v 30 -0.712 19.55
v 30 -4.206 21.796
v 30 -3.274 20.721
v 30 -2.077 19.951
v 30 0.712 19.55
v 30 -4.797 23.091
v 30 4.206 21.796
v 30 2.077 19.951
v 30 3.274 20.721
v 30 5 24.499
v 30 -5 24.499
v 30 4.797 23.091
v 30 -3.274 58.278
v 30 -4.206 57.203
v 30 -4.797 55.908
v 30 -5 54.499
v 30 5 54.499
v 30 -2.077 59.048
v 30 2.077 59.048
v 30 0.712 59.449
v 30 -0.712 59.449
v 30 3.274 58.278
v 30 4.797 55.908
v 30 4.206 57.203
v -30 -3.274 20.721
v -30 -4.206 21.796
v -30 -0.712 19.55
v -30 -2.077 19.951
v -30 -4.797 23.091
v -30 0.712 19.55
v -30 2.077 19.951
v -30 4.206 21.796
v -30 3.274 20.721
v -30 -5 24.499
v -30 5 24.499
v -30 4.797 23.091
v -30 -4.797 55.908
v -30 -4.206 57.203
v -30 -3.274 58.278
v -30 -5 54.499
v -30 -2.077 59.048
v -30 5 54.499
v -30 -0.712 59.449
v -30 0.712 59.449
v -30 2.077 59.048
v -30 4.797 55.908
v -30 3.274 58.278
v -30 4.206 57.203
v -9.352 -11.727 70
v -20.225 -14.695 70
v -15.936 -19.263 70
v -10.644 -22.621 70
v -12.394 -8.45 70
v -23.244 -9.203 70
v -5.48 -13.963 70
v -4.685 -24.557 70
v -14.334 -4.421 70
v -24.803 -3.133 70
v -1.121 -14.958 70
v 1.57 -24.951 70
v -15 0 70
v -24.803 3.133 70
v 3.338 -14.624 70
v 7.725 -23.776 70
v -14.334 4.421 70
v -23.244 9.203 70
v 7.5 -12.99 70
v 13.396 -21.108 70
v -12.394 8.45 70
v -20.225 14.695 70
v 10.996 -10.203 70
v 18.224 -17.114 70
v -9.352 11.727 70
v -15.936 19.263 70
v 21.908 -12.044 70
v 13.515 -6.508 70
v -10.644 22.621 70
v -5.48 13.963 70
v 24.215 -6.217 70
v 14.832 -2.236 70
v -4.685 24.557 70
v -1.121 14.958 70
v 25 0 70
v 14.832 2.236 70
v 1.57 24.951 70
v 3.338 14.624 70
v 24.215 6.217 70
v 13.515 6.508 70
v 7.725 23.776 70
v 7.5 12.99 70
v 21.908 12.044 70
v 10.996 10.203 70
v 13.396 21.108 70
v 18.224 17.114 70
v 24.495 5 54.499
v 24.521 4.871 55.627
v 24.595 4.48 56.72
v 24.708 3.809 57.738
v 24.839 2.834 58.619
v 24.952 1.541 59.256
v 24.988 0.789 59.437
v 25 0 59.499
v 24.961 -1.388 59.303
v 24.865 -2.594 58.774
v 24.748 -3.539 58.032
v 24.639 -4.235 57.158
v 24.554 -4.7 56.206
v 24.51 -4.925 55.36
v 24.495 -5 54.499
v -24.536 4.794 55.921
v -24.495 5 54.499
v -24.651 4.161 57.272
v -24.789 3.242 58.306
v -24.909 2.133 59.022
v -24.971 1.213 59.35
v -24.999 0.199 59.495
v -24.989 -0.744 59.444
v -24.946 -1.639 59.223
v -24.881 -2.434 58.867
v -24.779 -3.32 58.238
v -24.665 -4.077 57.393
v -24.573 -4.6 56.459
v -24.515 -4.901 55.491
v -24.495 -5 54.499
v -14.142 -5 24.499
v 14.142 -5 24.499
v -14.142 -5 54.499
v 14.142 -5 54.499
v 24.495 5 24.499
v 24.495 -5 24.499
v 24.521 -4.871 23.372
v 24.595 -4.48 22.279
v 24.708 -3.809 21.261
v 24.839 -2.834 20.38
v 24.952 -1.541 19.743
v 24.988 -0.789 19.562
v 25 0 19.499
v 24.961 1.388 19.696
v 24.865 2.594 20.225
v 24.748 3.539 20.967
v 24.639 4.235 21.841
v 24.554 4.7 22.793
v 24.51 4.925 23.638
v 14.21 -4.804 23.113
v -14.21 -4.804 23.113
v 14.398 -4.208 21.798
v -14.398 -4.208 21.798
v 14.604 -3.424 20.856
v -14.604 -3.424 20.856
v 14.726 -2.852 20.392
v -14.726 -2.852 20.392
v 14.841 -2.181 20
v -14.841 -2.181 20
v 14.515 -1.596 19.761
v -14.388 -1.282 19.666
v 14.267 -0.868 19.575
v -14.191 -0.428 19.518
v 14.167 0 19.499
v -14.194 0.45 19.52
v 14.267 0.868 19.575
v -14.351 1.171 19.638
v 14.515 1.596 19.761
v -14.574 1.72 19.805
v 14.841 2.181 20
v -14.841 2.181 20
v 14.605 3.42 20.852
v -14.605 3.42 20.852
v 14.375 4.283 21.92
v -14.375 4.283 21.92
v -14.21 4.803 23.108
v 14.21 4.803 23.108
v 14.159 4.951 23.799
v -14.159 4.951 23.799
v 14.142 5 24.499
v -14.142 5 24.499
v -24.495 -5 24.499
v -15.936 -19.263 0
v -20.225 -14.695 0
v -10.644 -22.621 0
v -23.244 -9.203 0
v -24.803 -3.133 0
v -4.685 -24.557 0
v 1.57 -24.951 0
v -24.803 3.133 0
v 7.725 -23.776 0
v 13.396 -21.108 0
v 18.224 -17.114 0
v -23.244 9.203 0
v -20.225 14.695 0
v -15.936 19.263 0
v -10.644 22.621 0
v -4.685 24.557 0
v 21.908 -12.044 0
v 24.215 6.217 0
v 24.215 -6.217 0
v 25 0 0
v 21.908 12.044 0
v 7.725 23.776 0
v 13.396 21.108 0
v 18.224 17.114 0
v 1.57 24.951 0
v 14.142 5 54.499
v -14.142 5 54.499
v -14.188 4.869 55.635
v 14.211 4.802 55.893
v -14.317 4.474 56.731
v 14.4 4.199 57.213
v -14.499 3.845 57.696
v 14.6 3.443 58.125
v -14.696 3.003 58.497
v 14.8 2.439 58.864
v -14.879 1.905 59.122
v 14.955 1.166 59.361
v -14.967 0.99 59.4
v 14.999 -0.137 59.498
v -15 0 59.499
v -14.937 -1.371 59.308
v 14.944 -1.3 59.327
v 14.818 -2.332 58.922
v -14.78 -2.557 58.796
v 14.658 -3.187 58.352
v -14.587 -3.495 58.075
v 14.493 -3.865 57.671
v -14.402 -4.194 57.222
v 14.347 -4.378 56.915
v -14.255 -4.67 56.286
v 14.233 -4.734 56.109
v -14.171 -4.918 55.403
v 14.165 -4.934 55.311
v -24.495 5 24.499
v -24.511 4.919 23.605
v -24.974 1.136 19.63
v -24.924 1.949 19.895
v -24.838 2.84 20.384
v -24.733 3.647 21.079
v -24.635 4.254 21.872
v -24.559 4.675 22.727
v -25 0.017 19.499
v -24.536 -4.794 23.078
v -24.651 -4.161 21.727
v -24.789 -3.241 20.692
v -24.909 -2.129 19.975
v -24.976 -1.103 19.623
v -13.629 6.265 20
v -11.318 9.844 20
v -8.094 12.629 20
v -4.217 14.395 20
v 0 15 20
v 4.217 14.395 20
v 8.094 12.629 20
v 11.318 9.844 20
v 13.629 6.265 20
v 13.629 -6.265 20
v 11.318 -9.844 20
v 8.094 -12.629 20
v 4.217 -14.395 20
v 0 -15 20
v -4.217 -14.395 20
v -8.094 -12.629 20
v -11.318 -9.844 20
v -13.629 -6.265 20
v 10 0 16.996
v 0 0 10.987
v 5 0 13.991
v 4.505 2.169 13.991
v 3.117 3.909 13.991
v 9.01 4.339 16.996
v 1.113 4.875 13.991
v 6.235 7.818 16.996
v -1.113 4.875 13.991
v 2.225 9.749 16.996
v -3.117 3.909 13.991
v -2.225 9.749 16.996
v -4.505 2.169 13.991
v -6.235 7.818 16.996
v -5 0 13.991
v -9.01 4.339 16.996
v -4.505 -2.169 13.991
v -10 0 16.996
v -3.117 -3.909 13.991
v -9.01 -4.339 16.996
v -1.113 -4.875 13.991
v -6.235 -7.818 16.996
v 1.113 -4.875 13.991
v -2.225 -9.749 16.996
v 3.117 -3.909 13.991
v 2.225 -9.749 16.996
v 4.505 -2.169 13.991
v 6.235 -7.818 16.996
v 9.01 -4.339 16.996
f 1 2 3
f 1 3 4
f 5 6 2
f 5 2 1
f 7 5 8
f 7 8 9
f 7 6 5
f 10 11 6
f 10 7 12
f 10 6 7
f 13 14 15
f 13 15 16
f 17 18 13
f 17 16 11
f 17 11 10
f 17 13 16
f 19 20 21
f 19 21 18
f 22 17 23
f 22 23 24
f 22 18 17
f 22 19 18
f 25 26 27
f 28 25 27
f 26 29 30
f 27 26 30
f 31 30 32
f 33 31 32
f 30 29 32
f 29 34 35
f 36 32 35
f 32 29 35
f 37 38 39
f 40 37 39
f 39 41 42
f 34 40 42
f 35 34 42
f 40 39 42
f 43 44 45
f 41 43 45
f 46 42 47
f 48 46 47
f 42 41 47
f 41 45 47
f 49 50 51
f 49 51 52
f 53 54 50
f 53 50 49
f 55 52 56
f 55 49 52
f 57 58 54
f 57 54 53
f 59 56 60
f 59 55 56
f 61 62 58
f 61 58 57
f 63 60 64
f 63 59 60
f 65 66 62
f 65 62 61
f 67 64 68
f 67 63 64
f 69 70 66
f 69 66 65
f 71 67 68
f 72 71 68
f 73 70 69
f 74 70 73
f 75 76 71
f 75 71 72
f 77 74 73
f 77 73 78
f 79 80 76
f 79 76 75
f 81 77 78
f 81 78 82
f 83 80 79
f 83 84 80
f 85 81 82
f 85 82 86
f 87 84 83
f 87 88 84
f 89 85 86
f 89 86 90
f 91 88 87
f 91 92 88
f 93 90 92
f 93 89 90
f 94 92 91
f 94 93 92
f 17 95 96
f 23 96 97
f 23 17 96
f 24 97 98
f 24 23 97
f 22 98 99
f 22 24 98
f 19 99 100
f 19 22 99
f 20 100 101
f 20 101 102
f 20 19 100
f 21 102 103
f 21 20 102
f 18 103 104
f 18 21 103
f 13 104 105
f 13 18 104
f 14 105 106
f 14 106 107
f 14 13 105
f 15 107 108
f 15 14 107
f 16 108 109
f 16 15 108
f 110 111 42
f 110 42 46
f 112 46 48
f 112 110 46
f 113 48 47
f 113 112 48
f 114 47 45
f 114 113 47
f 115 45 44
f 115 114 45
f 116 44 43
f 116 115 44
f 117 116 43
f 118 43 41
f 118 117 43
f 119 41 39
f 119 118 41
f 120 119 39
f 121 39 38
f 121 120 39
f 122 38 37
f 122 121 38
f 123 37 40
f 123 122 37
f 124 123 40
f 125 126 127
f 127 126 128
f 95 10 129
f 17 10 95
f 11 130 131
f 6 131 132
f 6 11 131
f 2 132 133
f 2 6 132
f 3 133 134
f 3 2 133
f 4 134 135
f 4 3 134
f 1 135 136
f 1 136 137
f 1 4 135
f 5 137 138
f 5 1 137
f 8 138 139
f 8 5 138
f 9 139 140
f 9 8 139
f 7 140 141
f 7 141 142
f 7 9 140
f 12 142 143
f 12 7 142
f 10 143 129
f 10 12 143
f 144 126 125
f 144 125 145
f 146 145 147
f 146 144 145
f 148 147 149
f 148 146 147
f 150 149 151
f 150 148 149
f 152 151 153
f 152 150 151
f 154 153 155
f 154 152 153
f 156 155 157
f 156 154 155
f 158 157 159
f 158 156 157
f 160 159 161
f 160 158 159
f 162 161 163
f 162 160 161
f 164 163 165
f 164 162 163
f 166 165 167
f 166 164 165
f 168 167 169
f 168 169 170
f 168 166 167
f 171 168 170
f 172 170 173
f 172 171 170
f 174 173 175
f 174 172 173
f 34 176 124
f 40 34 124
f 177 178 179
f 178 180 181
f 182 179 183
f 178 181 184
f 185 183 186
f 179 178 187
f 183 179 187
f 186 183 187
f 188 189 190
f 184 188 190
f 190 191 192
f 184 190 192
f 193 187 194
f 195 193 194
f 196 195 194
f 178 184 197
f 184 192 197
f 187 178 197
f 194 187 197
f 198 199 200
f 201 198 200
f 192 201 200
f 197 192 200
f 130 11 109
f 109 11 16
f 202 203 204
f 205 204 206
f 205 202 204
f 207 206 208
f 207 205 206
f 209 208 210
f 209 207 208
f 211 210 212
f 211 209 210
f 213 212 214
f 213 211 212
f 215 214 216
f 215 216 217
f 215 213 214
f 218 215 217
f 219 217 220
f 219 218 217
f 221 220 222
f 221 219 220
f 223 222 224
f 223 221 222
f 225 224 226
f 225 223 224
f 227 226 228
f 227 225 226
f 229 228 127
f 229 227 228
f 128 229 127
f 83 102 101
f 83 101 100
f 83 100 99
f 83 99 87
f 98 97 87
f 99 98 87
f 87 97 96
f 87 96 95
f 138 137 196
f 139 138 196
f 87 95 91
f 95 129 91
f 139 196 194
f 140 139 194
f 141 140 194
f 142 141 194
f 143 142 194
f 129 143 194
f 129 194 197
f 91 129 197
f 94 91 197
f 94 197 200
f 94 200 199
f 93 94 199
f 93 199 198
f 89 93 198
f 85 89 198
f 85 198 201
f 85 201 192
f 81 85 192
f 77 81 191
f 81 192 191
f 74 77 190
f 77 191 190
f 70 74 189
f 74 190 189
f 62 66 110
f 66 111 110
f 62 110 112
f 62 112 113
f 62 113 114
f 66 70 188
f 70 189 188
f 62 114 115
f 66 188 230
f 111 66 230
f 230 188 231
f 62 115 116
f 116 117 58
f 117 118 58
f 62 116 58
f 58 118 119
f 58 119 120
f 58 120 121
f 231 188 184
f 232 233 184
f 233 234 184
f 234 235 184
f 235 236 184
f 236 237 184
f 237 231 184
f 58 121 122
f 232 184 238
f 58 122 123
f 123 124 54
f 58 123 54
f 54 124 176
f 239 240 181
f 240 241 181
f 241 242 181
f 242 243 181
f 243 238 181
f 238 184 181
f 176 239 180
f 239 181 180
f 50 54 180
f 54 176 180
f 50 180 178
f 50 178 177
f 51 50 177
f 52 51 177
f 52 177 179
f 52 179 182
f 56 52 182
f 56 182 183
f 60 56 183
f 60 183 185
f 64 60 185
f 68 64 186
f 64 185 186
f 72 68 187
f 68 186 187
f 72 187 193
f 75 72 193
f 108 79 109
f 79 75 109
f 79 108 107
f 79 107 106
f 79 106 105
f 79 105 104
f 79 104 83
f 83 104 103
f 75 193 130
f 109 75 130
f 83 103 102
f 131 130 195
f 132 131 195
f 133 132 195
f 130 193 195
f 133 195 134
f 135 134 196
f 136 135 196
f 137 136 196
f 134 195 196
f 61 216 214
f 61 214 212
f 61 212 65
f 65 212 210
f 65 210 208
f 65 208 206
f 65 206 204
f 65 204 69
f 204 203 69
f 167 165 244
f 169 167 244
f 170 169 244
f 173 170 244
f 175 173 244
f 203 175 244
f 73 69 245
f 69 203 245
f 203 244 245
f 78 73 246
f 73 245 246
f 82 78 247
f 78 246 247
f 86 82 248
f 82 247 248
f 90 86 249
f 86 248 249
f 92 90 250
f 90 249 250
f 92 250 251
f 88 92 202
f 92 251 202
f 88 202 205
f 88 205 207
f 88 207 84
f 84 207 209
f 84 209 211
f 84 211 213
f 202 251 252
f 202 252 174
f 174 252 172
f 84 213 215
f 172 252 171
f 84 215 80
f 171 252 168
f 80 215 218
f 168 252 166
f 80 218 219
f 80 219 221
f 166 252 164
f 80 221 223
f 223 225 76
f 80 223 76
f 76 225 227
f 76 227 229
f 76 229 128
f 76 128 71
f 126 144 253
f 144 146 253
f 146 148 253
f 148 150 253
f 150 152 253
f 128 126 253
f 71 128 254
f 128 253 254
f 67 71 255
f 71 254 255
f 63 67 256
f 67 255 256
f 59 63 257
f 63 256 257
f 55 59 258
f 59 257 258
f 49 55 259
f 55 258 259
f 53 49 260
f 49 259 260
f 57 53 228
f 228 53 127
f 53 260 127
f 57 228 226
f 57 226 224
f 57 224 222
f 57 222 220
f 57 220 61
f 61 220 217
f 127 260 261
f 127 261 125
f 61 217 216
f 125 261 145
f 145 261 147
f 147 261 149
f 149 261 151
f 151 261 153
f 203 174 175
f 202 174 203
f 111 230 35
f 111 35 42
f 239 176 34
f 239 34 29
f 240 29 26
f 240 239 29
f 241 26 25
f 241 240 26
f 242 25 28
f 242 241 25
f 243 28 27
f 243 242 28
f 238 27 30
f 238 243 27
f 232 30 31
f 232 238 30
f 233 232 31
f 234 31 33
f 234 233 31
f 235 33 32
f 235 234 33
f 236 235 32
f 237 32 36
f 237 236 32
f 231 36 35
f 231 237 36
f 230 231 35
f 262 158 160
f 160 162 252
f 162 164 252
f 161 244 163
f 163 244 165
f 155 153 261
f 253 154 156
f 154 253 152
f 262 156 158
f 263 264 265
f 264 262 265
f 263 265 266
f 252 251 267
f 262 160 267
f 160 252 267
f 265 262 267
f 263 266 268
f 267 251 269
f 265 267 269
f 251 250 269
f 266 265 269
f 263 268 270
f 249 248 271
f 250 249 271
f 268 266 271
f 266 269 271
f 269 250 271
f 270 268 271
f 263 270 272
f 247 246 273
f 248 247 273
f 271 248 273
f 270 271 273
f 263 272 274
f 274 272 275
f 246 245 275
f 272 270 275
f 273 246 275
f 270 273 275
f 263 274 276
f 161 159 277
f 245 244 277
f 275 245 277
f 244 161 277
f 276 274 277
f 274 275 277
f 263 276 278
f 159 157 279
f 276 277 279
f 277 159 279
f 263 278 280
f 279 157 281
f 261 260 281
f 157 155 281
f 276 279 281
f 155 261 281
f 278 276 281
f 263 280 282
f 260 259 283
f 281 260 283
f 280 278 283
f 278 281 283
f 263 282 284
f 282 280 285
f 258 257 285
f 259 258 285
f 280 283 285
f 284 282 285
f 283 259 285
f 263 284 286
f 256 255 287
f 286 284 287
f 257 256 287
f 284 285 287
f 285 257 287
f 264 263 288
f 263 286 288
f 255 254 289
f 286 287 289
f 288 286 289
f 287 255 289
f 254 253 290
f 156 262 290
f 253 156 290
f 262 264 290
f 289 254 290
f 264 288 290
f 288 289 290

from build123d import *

# Parameters (mm, degrees)
F0_R     = 25
F1_DEPTH = 70
F3_D     = 30
F3_DEPTH = 50
F3_TIP   = 9.0129092854
F4_W     = 10
F4_H     = 30
F5_DEPTH = 30


with BuildPart() as f1:
    # F0 (on Top) → F1 (new body)
    with BuildSketch(Plane.XY):
        Circle(F0_R)
    extrude(amount=F1_DEPTH)

    # F3
    with Locations(Plane.XY.offset(70)):
        with Locations((0, 0)):
            Hole(F3_D / 2, depth=F3_DEPTH)
            with Locations((0, 0, -(F3_DEPTH + F3_TIP / 2))):  # 118° drill point
                Cone(0, F3_D / 2, F3_TIP, mode=Mode.SUBTRACT)

    # F4 (on Right) → F5 (join, symmetric)
    with BuildSketch(Plane.YZ):
        with BuildLine():
            ThreePointArc((5, 54.499398917), (0, 59.499398917), (-5, 54.499398917))
            Line((-5, 54.499398917), (5, 54.499398917))
        make_face()
        with Locations((0, 39.499398917)):
            Rectangle(F4_W, F4_H)
        with BuildLine():
            Line((5, 24.499398917), (-5, 24.499398917))
            ThreePointArc((-5, 24.499398917), (0, 19.499398917), (5, 24.499398917))
        make_face()
    extrude(amount=F5_DEPTH, both=True)


solid = f1.part
